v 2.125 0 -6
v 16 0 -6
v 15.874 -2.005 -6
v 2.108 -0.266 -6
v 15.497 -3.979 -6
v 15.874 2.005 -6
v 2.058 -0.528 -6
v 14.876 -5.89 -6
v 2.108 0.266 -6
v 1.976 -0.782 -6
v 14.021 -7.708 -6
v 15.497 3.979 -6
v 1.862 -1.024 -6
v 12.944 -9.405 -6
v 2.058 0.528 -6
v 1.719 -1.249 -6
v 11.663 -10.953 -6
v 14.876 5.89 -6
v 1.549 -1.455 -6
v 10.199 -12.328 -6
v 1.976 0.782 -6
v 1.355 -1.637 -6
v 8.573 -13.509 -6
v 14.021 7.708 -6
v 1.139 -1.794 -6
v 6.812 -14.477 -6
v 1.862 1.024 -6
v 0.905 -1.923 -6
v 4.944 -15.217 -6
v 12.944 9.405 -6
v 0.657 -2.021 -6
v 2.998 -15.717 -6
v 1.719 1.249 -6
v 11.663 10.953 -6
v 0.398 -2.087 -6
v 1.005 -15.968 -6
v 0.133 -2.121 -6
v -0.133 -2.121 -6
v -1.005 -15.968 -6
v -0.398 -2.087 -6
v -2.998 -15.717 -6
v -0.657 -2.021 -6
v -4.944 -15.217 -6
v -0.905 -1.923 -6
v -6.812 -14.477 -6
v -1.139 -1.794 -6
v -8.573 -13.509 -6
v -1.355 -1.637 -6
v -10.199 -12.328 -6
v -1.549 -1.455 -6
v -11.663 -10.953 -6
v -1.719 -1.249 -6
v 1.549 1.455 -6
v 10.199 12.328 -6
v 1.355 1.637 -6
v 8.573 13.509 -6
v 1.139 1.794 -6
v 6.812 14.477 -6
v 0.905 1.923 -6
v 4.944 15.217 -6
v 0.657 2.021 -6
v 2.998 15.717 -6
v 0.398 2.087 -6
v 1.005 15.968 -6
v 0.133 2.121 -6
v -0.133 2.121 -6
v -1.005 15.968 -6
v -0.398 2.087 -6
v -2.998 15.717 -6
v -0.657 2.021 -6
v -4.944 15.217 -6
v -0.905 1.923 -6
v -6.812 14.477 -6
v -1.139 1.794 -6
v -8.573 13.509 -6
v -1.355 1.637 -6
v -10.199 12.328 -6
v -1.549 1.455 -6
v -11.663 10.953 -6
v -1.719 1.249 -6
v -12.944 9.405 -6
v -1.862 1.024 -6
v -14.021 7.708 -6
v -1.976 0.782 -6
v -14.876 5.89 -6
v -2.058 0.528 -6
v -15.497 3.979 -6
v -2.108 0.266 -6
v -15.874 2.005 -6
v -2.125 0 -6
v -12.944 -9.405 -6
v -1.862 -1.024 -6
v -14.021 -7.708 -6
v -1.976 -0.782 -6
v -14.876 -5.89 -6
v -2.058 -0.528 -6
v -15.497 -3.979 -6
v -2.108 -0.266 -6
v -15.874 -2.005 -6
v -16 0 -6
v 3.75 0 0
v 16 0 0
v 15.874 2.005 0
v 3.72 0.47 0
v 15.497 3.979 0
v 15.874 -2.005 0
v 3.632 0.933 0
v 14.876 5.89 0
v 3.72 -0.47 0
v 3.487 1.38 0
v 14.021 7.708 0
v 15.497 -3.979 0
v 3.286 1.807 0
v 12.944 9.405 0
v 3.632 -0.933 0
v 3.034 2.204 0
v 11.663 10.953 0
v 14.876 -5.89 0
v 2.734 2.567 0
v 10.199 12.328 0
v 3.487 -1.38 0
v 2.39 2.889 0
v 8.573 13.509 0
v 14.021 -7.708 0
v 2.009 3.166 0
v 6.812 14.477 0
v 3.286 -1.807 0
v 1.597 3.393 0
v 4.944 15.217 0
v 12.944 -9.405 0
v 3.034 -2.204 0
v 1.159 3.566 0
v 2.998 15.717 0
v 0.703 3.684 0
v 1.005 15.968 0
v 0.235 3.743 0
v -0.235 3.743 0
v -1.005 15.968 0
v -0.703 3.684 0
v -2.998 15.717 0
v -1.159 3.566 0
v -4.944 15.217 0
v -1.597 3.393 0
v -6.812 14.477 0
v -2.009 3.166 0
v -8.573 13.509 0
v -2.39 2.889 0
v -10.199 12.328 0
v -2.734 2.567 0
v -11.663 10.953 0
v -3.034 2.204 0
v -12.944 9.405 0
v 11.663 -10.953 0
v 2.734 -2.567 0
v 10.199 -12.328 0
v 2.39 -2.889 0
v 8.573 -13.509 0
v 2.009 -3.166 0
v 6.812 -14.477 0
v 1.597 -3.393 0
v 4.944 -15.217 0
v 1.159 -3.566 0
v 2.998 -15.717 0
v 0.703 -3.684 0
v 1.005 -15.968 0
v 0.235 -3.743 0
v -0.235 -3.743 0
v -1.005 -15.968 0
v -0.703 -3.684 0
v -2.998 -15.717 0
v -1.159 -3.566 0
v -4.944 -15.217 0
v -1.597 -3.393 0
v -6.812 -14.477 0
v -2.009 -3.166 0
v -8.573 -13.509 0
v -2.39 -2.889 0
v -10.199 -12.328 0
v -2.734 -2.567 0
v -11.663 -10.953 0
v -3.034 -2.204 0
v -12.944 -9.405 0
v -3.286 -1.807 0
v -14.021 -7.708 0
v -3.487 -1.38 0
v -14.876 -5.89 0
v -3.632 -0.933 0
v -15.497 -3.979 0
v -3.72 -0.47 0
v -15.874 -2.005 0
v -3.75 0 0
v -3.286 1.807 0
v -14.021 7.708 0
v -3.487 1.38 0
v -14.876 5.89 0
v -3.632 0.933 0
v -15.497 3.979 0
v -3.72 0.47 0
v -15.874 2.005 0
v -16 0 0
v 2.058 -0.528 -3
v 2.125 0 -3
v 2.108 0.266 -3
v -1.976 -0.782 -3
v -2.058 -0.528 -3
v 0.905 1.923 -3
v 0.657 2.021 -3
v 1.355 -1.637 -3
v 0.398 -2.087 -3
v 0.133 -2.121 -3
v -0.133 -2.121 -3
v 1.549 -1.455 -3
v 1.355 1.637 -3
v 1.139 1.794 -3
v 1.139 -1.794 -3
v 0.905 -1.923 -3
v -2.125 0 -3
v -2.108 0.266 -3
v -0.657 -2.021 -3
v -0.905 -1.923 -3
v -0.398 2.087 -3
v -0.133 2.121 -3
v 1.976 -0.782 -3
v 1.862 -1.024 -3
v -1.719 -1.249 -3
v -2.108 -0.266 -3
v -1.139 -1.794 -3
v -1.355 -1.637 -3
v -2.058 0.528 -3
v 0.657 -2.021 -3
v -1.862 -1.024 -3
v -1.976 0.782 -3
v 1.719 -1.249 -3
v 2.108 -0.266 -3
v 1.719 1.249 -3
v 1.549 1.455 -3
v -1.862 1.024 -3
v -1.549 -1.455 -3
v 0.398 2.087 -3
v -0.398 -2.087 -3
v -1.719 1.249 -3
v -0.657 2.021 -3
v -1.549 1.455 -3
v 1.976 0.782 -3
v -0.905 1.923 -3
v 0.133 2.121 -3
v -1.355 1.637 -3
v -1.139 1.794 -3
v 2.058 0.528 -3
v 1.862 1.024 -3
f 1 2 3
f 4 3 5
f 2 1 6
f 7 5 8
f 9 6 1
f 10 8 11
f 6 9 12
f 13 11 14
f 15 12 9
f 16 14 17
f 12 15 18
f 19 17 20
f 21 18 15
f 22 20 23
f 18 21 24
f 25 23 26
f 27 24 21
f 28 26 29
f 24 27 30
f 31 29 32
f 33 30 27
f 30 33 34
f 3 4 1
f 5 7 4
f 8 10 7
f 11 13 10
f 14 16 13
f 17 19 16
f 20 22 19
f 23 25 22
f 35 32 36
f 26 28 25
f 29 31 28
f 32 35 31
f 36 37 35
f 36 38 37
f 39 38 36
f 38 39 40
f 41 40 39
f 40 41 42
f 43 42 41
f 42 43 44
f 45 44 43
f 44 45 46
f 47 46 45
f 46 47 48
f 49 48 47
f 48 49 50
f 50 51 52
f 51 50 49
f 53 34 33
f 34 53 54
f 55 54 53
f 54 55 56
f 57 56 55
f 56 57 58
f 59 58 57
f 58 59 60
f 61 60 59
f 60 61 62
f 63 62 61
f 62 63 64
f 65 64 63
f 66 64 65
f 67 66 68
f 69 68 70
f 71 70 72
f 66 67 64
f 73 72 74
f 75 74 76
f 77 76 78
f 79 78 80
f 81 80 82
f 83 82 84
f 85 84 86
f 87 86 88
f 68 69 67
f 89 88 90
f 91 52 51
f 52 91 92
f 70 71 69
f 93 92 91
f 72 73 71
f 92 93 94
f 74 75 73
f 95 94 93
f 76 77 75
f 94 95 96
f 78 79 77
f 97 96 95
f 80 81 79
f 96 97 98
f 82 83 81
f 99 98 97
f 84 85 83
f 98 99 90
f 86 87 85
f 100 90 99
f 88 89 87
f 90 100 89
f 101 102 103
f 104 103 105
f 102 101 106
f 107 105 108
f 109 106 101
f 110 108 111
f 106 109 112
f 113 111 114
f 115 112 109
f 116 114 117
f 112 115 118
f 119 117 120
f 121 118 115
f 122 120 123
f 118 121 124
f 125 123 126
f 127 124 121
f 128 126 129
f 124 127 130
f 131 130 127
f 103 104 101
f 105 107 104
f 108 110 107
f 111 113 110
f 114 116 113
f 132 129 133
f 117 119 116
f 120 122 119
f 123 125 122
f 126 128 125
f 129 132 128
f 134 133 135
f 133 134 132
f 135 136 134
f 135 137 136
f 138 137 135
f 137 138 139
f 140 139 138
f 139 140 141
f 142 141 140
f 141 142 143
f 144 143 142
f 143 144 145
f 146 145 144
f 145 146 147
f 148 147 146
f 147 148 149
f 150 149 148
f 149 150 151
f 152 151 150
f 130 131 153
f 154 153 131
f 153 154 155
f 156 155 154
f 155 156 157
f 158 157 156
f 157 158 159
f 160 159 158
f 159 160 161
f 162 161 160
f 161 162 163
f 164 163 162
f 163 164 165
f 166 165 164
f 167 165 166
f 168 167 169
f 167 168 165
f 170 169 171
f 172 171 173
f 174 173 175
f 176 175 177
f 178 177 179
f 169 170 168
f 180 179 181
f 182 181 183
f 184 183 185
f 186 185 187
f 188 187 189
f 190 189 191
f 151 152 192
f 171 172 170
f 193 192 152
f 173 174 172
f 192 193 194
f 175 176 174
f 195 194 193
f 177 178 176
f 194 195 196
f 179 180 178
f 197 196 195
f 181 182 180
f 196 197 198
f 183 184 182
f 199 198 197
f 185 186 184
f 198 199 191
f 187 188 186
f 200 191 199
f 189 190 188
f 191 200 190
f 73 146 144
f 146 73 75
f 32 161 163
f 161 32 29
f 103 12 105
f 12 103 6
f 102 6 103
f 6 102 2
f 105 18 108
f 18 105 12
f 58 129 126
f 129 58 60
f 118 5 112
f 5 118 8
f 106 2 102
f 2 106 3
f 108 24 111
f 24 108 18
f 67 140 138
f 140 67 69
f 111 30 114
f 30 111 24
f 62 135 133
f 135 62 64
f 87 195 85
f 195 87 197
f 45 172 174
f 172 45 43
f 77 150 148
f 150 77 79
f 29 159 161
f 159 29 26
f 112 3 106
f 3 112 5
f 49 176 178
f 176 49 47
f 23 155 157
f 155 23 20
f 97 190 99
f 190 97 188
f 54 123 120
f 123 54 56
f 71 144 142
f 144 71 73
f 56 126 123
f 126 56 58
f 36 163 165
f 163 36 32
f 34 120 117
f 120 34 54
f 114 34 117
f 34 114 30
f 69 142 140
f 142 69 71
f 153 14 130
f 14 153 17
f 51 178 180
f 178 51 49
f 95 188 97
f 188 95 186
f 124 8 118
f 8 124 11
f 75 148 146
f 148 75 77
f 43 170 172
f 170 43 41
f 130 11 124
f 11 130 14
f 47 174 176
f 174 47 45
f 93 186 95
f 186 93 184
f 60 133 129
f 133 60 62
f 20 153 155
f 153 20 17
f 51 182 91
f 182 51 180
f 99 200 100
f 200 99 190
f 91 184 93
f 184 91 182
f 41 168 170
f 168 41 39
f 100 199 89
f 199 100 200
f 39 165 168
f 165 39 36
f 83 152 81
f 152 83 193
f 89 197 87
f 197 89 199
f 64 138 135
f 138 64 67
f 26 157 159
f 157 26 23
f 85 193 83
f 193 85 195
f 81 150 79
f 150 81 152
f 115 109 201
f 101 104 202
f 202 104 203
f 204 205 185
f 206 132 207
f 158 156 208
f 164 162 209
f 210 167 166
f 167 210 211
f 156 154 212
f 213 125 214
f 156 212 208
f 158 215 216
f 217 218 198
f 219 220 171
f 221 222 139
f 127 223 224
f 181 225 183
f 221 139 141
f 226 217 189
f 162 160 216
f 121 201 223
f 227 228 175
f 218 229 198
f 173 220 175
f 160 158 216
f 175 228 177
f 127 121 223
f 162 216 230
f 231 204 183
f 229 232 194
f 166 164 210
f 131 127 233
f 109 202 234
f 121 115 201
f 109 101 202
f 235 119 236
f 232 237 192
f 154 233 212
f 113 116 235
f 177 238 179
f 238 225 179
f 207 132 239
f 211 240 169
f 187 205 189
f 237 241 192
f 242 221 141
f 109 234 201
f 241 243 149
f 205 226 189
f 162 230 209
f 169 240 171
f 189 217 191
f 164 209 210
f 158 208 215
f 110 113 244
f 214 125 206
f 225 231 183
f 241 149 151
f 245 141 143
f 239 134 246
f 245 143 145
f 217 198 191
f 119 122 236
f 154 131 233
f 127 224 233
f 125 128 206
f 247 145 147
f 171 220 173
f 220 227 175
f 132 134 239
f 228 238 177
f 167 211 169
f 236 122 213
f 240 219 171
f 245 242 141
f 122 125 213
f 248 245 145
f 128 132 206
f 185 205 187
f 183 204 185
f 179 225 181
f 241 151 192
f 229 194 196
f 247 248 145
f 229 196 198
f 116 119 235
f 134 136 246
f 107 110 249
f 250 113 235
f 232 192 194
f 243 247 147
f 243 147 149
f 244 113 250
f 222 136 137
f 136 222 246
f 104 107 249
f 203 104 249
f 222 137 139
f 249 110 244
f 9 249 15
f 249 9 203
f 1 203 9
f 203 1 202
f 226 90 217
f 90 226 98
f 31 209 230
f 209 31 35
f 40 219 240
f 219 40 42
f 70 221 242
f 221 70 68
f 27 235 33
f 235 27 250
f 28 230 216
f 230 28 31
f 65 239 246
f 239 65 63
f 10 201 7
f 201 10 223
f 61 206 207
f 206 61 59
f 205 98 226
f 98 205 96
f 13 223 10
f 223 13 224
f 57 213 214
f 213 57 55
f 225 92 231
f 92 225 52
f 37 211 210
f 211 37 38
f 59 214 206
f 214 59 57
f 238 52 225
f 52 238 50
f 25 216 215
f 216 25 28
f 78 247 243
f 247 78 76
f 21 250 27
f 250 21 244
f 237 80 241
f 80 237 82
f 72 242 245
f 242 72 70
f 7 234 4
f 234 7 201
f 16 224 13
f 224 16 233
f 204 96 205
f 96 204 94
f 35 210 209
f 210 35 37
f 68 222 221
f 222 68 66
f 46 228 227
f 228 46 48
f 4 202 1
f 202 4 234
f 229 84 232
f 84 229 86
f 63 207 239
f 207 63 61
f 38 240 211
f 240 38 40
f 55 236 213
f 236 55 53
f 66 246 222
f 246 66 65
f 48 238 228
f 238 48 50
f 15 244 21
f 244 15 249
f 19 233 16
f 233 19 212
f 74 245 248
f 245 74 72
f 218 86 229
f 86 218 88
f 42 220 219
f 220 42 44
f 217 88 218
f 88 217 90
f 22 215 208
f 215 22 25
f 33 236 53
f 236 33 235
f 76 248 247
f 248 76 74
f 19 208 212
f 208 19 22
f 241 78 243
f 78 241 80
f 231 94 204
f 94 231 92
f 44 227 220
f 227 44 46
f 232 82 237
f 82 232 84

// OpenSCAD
$fn = 50;


difference() {
	union() {
		translate(v = [0, 0, -6.0000000000]) {
			cylinder(h = 6, r = 10.0000000000);
		}
		translate(v = [0, 0, -6.0000000000]) {
			cylinder(h = 6, r = 16.0000000000);
		}
	}
	union() {
		translate(v = [0, 0, 0]) {
			rotate(a = [0, 0, 0]) {
				difference() {
					union() {
						#translate(v = [0, 0, -6.0000000000]) {
							cylinder(h = 6, r = 2.0000000000);
						}
						#translate(v = [0, 0, -3]) {
							cylinder(h = 3, r = 10.0000000000, r1 = 2.1250000000, r2 = 3.7500000000);
						}
						#translate(v = [0, 0, -6.0000000000]) {
							cylinder(h = 6, r = 2.1250000000);
						}
						#translate(v = [0, 0, -6.0000000000]) {
							cylinder(h = 6, r = 2.0000000000);
						}
					}
					union();
				}
			}
		}
	}
}
